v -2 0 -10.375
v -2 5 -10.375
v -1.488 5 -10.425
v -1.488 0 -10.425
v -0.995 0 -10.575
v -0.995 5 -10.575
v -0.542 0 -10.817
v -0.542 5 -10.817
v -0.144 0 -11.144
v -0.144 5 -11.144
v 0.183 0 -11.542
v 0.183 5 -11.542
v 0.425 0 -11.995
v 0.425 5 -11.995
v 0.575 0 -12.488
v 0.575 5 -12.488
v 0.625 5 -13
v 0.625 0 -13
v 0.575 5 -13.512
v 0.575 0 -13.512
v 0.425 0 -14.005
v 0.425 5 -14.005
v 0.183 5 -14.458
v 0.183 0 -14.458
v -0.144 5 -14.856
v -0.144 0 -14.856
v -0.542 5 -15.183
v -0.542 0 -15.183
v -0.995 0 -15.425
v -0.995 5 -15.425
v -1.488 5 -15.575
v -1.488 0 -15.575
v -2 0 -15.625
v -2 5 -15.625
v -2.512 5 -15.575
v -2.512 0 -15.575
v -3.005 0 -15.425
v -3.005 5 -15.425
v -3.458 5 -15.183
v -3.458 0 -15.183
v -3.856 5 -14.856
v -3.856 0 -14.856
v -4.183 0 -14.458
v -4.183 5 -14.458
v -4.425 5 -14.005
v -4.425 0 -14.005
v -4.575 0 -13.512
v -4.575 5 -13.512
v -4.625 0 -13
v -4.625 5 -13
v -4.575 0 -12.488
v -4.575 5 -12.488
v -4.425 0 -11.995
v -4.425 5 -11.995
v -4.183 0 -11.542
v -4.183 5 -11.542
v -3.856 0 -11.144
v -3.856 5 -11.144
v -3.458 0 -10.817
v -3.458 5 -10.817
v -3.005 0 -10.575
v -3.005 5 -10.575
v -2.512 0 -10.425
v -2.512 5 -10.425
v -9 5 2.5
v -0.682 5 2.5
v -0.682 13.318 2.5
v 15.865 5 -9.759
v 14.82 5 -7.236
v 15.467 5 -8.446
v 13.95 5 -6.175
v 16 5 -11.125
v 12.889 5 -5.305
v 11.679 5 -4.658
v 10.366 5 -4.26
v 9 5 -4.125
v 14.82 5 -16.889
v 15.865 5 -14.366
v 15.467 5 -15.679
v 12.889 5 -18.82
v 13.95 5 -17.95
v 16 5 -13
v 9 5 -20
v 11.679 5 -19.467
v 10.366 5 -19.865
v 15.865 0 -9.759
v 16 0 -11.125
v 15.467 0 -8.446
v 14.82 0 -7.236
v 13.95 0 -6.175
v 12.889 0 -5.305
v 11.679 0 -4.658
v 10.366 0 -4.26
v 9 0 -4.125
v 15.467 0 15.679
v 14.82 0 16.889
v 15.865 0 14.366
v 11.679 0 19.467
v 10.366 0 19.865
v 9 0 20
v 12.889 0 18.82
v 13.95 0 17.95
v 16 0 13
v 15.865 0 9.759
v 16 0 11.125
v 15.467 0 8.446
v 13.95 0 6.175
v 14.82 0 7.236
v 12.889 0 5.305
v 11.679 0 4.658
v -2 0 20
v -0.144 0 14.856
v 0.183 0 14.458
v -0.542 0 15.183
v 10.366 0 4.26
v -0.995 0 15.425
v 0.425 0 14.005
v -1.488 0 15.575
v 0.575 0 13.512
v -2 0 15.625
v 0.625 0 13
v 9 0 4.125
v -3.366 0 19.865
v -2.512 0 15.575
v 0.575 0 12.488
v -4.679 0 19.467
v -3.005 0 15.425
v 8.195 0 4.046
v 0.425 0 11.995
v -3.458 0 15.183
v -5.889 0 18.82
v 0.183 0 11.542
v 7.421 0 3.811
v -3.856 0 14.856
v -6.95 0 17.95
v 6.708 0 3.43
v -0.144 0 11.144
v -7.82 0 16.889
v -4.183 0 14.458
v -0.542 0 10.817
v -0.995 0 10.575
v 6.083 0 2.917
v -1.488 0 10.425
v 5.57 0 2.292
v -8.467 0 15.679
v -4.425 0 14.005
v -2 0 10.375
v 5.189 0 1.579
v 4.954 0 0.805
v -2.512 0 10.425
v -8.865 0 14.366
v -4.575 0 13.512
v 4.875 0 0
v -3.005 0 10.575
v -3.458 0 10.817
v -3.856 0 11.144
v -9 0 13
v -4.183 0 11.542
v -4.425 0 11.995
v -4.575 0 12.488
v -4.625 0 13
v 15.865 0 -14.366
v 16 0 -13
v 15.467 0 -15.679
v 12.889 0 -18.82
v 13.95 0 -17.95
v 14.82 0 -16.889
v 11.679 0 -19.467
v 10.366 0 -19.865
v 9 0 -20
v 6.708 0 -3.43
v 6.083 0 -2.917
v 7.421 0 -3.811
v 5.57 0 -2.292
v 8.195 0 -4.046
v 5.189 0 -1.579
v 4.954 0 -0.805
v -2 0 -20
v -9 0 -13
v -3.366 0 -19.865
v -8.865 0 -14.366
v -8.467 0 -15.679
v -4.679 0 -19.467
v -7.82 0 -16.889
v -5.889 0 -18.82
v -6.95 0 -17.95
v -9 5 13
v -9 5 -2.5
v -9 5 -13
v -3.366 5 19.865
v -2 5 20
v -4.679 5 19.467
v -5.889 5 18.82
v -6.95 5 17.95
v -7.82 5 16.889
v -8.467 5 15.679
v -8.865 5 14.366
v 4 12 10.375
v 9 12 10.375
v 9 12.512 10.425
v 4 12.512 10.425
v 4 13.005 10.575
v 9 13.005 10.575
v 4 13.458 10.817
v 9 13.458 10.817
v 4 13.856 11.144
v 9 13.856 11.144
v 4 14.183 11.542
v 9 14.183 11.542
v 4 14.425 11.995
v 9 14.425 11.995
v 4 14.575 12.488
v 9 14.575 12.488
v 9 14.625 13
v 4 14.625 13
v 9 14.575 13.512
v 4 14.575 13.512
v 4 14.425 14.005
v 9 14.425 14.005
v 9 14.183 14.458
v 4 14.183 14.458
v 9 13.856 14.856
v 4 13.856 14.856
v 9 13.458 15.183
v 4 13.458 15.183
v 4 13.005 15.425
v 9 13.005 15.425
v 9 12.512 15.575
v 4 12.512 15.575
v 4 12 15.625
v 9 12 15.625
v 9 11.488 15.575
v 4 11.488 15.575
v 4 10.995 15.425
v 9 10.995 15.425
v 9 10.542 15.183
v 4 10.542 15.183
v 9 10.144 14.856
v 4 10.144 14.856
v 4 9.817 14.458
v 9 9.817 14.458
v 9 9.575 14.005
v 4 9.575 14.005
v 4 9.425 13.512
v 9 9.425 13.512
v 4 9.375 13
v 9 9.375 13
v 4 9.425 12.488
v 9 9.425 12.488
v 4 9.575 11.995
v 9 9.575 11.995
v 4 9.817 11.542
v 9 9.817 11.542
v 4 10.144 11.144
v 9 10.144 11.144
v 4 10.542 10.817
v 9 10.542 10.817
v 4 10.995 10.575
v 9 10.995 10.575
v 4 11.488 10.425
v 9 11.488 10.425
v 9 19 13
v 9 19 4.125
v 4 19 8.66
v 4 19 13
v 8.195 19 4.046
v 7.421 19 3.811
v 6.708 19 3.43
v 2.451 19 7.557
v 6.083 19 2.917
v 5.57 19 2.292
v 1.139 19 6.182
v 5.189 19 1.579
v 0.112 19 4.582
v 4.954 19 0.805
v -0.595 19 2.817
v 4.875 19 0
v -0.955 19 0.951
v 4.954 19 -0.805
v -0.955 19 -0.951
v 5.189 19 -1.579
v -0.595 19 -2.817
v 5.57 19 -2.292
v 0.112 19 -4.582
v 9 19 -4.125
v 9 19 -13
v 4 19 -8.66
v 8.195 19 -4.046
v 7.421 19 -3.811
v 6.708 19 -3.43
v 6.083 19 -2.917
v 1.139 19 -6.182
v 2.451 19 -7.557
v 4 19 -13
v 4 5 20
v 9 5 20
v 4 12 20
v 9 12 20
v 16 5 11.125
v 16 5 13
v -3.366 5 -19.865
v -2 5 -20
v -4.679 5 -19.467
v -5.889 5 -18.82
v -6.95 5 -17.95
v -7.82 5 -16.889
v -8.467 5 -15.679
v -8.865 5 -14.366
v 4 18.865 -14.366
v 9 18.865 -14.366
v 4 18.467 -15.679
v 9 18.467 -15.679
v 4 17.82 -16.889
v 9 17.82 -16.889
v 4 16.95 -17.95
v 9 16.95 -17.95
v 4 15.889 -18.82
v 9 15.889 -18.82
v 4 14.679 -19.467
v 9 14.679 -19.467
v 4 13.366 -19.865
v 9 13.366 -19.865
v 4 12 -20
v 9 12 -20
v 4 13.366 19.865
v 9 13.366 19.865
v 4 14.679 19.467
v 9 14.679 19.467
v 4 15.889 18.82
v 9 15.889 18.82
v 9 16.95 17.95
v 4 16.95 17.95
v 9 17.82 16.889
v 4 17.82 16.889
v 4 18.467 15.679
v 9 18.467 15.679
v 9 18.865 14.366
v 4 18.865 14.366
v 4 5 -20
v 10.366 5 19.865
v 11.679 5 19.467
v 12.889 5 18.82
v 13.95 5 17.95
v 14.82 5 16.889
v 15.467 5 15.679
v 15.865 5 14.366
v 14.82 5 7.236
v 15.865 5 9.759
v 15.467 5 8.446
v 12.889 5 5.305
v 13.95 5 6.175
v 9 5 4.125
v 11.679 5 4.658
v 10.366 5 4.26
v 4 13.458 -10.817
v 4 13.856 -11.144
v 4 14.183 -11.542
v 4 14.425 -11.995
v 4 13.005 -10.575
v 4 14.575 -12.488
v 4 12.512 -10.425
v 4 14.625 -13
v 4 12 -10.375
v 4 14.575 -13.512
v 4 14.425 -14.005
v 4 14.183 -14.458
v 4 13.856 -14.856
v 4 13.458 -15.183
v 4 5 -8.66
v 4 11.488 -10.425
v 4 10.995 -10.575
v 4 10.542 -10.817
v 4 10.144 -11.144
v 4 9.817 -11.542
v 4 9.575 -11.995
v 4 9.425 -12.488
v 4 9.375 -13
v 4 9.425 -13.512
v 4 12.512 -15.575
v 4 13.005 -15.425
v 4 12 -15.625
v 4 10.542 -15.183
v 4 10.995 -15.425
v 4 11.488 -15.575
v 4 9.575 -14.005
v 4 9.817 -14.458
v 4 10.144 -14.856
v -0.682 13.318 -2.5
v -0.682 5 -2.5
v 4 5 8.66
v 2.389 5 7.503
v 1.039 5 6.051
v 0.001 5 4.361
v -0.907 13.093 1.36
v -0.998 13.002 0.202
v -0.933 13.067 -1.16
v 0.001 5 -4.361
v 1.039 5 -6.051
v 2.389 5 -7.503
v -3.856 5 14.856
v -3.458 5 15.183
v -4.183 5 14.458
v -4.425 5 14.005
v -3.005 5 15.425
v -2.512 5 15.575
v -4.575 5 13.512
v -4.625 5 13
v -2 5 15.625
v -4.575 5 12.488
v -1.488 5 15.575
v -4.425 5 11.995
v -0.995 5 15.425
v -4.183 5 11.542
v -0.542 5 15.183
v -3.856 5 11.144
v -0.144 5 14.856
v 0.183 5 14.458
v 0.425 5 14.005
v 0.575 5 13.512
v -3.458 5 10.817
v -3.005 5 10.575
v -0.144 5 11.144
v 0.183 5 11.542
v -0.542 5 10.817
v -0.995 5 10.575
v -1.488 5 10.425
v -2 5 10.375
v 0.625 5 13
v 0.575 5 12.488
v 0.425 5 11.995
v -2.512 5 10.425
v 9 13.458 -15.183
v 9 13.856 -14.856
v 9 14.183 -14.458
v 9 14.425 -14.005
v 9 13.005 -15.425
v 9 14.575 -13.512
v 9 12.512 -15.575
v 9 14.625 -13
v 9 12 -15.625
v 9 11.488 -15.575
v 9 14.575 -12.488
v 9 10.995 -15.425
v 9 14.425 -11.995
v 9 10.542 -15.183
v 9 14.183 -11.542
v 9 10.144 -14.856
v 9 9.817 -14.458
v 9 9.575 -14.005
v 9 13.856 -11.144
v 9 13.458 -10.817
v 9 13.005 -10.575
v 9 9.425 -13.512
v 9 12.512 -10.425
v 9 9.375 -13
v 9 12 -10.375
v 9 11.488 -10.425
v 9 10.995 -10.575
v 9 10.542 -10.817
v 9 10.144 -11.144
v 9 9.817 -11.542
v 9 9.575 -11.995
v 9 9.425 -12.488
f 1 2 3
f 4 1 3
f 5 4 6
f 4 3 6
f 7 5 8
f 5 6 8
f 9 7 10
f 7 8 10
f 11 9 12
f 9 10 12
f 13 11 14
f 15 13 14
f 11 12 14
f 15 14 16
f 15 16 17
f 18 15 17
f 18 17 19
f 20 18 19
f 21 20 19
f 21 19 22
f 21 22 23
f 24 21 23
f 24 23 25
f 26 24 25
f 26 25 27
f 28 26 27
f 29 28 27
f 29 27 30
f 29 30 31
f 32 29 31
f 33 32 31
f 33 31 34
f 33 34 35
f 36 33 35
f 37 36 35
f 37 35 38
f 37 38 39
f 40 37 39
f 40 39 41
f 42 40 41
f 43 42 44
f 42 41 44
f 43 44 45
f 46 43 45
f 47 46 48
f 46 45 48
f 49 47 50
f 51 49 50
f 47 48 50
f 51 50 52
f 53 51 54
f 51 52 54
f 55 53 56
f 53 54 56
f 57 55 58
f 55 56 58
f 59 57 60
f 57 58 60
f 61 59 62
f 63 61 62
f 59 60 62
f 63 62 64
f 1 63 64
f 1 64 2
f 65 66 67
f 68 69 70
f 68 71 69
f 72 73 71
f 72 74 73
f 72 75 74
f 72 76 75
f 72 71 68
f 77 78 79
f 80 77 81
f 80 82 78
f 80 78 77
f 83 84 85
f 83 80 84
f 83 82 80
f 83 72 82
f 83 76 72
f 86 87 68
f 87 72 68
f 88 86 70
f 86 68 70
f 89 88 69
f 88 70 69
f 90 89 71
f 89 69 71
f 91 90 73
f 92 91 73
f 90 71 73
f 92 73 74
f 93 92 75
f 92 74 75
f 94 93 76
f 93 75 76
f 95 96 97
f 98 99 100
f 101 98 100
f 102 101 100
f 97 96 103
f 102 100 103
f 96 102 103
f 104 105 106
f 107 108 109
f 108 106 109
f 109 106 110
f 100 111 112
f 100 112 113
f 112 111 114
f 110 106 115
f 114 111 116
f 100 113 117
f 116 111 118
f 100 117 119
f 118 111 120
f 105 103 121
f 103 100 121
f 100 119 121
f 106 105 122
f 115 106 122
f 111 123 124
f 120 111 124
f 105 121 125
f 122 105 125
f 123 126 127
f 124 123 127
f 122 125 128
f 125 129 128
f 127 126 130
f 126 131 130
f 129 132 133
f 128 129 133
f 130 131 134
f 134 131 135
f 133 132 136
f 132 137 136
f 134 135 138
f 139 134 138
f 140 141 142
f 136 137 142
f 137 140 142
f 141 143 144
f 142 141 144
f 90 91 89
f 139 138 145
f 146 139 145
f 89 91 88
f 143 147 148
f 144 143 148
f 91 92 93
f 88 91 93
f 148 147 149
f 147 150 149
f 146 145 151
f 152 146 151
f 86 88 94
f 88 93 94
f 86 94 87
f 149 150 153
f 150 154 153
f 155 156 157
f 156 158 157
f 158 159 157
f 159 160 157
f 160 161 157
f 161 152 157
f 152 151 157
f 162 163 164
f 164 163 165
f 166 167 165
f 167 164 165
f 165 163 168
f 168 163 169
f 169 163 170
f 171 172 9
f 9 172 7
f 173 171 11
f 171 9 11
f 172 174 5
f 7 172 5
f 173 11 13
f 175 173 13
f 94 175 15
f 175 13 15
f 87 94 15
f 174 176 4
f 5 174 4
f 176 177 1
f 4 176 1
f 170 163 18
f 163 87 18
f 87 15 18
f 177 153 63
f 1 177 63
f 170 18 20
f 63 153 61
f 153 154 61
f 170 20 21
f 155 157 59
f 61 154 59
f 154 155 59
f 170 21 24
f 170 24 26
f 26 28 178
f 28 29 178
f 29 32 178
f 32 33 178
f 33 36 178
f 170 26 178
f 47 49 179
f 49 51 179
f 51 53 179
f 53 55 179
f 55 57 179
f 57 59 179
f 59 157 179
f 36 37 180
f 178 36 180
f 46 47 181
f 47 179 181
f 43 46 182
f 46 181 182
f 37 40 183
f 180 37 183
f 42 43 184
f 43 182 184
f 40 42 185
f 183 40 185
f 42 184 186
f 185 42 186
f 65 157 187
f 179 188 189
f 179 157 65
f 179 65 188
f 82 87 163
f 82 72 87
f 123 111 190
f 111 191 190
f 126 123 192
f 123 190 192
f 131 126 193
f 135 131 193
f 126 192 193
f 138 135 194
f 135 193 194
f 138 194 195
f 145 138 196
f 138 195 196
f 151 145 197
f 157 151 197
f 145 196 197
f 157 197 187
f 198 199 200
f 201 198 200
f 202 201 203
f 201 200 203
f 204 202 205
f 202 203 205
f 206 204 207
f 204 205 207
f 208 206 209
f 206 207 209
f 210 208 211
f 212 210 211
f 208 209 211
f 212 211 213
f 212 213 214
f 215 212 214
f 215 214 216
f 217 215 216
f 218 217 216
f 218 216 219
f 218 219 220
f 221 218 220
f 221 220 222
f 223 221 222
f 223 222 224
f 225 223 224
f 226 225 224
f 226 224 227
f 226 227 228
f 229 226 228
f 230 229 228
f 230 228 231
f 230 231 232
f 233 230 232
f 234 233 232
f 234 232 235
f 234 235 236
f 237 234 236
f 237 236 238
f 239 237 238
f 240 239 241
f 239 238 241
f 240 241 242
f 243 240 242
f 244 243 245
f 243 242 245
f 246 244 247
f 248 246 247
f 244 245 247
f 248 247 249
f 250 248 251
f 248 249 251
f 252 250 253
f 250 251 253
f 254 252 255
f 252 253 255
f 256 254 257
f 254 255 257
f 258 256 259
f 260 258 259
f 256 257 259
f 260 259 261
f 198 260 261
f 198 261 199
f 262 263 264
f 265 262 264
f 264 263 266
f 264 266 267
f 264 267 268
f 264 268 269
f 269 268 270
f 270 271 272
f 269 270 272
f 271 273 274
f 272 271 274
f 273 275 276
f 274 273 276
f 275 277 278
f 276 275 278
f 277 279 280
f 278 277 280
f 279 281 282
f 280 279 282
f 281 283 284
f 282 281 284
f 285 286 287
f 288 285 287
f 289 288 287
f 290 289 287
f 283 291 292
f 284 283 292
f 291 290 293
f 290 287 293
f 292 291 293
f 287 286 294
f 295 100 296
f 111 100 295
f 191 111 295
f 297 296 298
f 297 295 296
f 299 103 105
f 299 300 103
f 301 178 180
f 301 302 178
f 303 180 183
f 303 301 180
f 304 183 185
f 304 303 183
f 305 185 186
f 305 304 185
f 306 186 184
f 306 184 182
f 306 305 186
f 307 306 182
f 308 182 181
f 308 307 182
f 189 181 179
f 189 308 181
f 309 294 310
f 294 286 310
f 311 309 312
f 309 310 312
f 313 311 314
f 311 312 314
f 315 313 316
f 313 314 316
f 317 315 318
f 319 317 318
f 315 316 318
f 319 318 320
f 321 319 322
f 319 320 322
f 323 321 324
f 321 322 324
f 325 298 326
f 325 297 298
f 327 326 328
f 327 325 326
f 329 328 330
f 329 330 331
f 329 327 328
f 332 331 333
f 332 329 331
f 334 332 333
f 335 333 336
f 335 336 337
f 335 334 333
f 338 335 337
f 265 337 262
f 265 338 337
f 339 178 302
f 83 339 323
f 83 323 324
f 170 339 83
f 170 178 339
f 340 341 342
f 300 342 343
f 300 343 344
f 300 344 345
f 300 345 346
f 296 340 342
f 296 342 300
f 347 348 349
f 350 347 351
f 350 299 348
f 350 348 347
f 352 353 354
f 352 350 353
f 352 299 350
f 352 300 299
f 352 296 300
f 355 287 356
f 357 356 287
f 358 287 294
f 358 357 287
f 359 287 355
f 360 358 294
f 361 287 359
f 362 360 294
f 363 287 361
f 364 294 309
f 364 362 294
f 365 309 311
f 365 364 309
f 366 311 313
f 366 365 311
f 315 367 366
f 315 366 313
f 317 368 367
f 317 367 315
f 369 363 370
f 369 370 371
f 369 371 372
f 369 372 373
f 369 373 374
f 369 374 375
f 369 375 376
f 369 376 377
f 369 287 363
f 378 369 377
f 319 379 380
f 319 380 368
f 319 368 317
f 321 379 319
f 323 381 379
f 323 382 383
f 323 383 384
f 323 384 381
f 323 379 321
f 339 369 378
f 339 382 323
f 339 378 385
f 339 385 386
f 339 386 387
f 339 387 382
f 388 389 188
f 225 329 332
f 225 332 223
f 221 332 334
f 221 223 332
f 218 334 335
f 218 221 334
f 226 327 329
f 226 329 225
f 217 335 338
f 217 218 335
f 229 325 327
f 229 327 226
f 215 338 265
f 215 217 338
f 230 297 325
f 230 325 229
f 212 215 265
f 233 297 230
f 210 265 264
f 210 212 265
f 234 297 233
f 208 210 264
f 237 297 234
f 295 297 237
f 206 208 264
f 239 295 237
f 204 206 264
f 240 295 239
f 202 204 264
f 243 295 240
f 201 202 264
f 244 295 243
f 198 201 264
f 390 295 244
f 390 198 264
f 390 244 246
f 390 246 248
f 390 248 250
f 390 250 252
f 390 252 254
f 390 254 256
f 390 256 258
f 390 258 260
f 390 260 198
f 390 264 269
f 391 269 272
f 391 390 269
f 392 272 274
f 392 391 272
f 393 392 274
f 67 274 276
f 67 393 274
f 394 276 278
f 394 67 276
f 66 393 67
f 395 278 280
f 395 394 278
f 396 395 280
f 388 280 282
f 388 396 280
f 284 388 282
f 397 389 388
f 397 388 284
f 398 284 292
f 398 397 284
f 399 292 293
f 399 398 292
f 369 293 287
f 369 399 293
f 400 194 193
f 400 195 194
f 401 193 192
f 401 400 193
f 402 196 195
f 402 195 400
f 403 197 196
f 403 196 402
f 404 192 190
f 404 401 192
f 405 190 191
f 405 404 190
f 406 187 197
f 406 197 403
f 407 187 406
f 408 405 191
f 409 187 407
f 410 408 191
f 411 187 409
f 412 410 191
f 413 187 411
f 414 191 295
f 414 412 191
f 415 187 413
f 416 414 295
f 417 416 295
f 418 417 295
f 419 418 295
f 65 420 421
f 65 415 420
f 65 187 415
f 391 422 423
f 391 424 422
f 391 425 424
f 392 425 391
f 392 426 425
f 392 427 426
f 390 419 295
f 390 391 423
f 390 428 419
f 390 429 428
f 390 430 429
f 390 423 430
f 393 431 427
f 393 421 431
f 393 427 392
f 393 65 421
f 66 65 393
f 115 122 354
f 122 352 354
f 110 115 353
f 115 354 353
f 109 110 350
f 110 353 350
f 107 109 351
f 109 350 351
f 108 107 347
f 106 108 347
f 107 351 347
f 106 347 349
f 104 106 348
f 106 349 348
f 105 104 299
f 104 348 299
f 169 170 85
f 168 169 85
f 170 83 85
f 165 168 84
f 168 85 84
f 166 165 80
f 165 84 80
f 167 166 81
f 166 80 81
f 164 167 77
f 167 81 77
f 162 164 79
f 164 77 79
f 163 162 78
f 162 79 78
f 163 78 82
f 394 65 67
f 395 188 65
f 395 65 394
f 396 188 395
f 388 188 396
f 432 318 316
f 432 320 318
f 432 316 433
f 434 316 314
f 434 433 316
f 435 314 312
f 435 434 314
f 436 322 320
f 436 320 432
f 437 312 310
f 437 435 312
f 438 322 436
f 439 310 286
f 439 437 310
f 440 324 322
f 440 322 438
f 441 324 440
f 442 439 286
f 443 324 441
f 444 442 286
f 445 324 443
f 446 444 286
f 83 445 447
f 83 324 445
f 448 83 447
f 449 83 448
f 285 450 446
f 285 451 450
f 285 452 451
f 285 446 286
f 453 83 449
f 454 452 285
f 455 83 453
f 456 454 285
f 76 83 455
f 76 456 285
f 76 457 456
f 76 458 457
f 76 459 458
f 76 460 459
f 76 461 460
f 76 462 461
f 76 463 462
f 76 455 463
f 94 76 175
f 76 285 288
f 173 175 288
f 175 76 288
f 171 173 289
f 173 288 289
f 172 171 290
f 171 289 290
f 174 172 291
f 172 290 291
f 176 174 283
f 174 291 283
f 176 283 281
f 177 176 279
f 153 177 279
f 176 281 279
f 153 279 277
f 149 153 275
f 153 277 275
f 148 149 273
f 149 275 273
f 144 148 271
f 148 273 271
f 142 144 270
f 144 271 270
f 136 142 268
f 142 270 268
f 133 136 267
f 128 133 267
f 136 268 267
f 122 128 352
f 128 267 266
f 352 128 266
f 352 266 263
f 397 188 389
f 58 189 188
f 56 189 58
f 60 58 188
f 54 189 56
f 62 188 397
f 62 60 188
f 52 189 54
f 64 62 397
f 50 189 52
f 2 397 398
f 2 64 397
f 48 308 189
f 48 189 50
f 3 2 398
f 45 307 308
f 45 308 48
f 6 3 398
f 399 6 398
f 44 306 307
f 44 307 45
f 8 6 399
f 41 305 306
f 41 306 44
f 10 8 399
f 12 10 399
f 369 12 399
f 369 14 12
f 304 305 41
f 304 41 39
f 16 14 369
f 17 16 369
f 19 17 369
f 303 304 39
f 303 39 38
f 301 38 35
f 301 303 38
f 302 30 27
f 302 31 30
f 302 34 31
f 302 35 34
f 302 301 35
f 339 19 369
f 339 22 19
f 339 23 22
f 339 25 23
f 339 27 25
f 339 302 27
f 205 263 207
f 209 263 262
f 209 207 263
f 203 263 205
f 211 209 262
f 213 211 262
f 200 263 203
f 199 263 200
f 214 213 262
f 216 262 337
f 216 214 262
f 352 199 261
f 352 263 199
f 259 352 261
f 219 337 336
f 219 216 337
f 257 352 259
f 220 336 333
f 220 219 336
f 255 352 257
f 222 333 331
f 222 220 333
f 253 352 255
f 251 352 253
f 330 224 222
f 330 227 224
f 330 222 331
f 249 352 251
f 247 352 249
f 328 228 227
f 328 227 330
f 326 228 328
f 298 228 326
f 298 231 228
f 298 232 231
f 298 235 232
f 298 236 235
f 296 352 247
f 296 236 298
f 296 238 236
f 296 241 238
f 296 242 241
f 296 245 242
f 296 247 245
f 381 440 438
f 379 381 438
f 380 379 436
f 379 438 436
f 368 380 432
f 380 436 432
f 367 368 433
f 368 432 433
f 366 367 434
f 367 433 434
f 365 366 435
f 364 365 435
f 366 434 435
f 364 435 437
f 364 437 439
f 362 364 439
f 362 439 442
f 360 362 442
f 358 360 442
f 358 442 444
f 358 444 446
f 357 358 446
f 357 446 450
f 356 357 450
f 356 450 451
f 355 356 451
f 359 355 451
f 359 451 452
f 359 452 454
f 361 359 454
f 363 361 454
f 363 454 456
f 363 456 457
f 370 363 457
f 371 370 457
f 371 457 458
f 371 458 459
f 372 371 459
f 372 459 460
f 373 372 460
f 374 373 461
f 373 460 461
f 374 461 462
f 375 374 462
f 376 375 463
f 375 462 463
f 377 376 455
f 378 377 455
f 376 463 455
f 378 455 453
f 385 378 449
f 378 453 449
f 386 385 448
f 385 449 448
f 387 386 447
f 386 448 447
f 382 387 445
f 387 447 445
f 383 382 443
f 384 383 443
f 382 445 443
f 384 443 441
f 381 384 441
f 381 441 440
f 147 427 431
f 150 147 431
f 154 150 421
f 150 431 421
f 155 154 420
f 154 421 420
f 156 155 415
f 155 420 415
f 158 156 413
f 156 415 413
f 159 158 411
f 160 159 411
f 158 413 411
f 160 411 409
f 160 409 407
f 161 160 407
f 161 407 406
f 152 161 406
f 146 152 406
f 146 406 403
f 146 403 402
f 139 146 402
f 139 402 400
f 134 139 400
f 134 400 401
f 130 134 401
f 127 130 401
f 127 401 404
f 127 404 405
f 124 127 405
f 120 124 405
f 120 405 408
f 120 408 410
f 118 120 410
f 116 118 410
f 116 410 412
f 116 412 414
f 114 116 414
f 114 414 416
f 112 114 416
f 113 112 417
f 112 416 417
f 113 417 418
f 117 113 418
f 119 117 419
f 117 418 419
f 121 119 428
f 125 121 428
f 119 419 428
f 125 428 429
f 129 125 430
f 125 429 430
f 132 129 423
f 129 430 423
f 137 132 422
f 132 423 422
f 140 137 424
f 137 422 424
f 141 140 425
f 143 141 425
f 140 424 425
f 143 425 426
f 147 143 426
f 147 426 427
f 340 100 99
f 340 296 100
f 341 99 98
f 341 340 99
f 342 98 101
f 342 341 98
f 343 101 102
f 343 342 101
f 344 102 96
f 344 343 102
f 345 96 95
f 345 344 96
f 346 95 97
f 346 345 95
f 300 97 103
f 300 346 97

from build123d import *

# Parameters (mm, degrees)
SKETCH1_W                = 18
SKETCH1_H                = 40
BOSS_EXTRUDE1_DEPTH      = 5
BOSS_EXTRUDE2_DEPTH      = 14
SKETCH3_R                = 4.125
CUT_EXTRUDE1_DEPTH       = 30.017236257
FILLET1_R                = 7
SKETCH6_R                = 2.625
CUT_EXTRUDE3_DEPTH       = 33.939338184
SKETCH7_W                = 15.875
SKETCH7_H                = 5
BOSS_EXTRUDE3_DEPTH      = 7
FILLET2_R                = 7
SKETCH8_R                = 2.625
CUT_EXTRUDE4_DEPTH       = 30.189039039
BOSS_EXTRUDE4_DEPTH      = 2.5
BOSS_EXTRUDE4_DEPTH_BACK = 2.5


with BuildPart() as part:
    # Sketch1 → Boss-Extrude1 (new body)
    with BuildSketch(Plane(origin=(0, 0, 0), x_dir=(1, 0, 0), z_dir=(0, 1, 0))):
        Rectangle(SKETCH1_W, SKETCH1_H)
    extrude(amount=BOSS_EXTRUDE1_DEPTH)

    # Sketch2 → Boss-Extrude2 (add)
    with BuildSketch(Plane(origin=(0, 5, 0), x_dir=(1, 0, 0), z_dir=(0, 1, 0))):
        with BuildLine():
            Line((4, -20), (4, -8.660254038))
            ThreePointArc((4, -8.660254038), (-1, 0), (4, 8.660254038))
            Line((4, 8.660254038), (4, 20))
            Line((4, 20), (9, 20))
            Line((9, 20), (9, -20))
            Line((9, -20), (4, -20))
        make_face()
    extrude(amount=BOSS_EXTRUDE2_DEPTH)

    # Sketch3 → Cut-Extrude1 (cut, through all)
    with BuildSketch(Plane(origin=(0, 19, 0), x_dir=(1, 0, 0), z_dir=(0, 1, 0))):
        with Locations((9, 0)):
            Circle(SKETCH3_R)
    extrude(amount=-CUT_EXTRUDE1_DEPTH, mode=Mode.SUBTRACT)

    # Fillet1
    fillet1_edges = [part.edges().sort_by_distance(p)[0] for p in [
        (6.5, 19, 20),
        (6.5, 19, -20),
    ]]
    fillet(fillet1_edges, radius=FILLET1_R)

    # Sketch6 → Cut-Extrude3 (cut, through all)
    with BuildSketch(Plane(origin=(9, 0, 0), x_dir=(0, 0, -1), z_dir=(1, 0, 0))):
        with Locations((-13, 12)):
            Circle(SKETCH6_R)
        with Locations((13, 12)):
            Circle(SKETCH6_R)
    extrude(amount=-CUT_EXTRUDE3_DEPTH, mode=Mode.SUBTRACT)

    # Sketch7 → Boss-Extrude3 (add)
    with BuildSketch(Plane(origin=(9, 0, 0), x_dir=(0, 0, -1), z_dir=(1, 0, 0))):
        with Locations((-12.0625, 2.5)):
            Rectangle(SKETCH7_W, SKETCH7_H)
        with Locations((12.0625, 2.5)):
            Rectangle(SKETCH7_W, SKETCH7_H)
    extrude(amount=BOSS_EXTRUDE3_DEPTH)

    # Fillet2
    fillet2_edges = [part.edges().sort_by_distance(p)[0] for p in [
        (-9, 2.5, -20),
        (16, 2.5, -20),
        (16, 2.5, 20),
        (-9, 2.5, 20),
        (16, 2.5, -4.125),
        (16, 2.5, 4.125),
    ]]
    fillet(fillet2_edges, radius=FILLET2_R - 0.0001)  # a hair under: the kernel refuses the full size

    # Sketch8 → Cut-Extrude4 (cut, through all)
    with BuildSketch(Plane(origin=(0, 5, 0), x_dir=(1, 0, 0), z_dir=(0, 1, 0))):
        with Locations(Location((-2, 13, 0), (0, 0, 270))):
            Circle(SKETCH8_R)
        with Locations(Location((-2, -13, 0), (0, 0, 90))):
            Circle(SKETCH8_R)
    extrude(amount=-CUT_EXTRUDE4_DEPTH, mode=Mode.SUBTRACT)

    # Sketch9 → Boss-Extrude4 (add, two sides: drawn at the far end of the back side and taken through both)
    with BuildSketch(Plane.XY.offset(-BOSS_EXTRUDE4_DEPTH_BACK)):
        Polygon((-9, 5), (2, 16), (2, 5), align=None)
    extrude(amount=BOSS_EXTRUDE4_DEPTH + BOSS_EXTRUDE4_DEPTH_BACK)


solid = part.part
